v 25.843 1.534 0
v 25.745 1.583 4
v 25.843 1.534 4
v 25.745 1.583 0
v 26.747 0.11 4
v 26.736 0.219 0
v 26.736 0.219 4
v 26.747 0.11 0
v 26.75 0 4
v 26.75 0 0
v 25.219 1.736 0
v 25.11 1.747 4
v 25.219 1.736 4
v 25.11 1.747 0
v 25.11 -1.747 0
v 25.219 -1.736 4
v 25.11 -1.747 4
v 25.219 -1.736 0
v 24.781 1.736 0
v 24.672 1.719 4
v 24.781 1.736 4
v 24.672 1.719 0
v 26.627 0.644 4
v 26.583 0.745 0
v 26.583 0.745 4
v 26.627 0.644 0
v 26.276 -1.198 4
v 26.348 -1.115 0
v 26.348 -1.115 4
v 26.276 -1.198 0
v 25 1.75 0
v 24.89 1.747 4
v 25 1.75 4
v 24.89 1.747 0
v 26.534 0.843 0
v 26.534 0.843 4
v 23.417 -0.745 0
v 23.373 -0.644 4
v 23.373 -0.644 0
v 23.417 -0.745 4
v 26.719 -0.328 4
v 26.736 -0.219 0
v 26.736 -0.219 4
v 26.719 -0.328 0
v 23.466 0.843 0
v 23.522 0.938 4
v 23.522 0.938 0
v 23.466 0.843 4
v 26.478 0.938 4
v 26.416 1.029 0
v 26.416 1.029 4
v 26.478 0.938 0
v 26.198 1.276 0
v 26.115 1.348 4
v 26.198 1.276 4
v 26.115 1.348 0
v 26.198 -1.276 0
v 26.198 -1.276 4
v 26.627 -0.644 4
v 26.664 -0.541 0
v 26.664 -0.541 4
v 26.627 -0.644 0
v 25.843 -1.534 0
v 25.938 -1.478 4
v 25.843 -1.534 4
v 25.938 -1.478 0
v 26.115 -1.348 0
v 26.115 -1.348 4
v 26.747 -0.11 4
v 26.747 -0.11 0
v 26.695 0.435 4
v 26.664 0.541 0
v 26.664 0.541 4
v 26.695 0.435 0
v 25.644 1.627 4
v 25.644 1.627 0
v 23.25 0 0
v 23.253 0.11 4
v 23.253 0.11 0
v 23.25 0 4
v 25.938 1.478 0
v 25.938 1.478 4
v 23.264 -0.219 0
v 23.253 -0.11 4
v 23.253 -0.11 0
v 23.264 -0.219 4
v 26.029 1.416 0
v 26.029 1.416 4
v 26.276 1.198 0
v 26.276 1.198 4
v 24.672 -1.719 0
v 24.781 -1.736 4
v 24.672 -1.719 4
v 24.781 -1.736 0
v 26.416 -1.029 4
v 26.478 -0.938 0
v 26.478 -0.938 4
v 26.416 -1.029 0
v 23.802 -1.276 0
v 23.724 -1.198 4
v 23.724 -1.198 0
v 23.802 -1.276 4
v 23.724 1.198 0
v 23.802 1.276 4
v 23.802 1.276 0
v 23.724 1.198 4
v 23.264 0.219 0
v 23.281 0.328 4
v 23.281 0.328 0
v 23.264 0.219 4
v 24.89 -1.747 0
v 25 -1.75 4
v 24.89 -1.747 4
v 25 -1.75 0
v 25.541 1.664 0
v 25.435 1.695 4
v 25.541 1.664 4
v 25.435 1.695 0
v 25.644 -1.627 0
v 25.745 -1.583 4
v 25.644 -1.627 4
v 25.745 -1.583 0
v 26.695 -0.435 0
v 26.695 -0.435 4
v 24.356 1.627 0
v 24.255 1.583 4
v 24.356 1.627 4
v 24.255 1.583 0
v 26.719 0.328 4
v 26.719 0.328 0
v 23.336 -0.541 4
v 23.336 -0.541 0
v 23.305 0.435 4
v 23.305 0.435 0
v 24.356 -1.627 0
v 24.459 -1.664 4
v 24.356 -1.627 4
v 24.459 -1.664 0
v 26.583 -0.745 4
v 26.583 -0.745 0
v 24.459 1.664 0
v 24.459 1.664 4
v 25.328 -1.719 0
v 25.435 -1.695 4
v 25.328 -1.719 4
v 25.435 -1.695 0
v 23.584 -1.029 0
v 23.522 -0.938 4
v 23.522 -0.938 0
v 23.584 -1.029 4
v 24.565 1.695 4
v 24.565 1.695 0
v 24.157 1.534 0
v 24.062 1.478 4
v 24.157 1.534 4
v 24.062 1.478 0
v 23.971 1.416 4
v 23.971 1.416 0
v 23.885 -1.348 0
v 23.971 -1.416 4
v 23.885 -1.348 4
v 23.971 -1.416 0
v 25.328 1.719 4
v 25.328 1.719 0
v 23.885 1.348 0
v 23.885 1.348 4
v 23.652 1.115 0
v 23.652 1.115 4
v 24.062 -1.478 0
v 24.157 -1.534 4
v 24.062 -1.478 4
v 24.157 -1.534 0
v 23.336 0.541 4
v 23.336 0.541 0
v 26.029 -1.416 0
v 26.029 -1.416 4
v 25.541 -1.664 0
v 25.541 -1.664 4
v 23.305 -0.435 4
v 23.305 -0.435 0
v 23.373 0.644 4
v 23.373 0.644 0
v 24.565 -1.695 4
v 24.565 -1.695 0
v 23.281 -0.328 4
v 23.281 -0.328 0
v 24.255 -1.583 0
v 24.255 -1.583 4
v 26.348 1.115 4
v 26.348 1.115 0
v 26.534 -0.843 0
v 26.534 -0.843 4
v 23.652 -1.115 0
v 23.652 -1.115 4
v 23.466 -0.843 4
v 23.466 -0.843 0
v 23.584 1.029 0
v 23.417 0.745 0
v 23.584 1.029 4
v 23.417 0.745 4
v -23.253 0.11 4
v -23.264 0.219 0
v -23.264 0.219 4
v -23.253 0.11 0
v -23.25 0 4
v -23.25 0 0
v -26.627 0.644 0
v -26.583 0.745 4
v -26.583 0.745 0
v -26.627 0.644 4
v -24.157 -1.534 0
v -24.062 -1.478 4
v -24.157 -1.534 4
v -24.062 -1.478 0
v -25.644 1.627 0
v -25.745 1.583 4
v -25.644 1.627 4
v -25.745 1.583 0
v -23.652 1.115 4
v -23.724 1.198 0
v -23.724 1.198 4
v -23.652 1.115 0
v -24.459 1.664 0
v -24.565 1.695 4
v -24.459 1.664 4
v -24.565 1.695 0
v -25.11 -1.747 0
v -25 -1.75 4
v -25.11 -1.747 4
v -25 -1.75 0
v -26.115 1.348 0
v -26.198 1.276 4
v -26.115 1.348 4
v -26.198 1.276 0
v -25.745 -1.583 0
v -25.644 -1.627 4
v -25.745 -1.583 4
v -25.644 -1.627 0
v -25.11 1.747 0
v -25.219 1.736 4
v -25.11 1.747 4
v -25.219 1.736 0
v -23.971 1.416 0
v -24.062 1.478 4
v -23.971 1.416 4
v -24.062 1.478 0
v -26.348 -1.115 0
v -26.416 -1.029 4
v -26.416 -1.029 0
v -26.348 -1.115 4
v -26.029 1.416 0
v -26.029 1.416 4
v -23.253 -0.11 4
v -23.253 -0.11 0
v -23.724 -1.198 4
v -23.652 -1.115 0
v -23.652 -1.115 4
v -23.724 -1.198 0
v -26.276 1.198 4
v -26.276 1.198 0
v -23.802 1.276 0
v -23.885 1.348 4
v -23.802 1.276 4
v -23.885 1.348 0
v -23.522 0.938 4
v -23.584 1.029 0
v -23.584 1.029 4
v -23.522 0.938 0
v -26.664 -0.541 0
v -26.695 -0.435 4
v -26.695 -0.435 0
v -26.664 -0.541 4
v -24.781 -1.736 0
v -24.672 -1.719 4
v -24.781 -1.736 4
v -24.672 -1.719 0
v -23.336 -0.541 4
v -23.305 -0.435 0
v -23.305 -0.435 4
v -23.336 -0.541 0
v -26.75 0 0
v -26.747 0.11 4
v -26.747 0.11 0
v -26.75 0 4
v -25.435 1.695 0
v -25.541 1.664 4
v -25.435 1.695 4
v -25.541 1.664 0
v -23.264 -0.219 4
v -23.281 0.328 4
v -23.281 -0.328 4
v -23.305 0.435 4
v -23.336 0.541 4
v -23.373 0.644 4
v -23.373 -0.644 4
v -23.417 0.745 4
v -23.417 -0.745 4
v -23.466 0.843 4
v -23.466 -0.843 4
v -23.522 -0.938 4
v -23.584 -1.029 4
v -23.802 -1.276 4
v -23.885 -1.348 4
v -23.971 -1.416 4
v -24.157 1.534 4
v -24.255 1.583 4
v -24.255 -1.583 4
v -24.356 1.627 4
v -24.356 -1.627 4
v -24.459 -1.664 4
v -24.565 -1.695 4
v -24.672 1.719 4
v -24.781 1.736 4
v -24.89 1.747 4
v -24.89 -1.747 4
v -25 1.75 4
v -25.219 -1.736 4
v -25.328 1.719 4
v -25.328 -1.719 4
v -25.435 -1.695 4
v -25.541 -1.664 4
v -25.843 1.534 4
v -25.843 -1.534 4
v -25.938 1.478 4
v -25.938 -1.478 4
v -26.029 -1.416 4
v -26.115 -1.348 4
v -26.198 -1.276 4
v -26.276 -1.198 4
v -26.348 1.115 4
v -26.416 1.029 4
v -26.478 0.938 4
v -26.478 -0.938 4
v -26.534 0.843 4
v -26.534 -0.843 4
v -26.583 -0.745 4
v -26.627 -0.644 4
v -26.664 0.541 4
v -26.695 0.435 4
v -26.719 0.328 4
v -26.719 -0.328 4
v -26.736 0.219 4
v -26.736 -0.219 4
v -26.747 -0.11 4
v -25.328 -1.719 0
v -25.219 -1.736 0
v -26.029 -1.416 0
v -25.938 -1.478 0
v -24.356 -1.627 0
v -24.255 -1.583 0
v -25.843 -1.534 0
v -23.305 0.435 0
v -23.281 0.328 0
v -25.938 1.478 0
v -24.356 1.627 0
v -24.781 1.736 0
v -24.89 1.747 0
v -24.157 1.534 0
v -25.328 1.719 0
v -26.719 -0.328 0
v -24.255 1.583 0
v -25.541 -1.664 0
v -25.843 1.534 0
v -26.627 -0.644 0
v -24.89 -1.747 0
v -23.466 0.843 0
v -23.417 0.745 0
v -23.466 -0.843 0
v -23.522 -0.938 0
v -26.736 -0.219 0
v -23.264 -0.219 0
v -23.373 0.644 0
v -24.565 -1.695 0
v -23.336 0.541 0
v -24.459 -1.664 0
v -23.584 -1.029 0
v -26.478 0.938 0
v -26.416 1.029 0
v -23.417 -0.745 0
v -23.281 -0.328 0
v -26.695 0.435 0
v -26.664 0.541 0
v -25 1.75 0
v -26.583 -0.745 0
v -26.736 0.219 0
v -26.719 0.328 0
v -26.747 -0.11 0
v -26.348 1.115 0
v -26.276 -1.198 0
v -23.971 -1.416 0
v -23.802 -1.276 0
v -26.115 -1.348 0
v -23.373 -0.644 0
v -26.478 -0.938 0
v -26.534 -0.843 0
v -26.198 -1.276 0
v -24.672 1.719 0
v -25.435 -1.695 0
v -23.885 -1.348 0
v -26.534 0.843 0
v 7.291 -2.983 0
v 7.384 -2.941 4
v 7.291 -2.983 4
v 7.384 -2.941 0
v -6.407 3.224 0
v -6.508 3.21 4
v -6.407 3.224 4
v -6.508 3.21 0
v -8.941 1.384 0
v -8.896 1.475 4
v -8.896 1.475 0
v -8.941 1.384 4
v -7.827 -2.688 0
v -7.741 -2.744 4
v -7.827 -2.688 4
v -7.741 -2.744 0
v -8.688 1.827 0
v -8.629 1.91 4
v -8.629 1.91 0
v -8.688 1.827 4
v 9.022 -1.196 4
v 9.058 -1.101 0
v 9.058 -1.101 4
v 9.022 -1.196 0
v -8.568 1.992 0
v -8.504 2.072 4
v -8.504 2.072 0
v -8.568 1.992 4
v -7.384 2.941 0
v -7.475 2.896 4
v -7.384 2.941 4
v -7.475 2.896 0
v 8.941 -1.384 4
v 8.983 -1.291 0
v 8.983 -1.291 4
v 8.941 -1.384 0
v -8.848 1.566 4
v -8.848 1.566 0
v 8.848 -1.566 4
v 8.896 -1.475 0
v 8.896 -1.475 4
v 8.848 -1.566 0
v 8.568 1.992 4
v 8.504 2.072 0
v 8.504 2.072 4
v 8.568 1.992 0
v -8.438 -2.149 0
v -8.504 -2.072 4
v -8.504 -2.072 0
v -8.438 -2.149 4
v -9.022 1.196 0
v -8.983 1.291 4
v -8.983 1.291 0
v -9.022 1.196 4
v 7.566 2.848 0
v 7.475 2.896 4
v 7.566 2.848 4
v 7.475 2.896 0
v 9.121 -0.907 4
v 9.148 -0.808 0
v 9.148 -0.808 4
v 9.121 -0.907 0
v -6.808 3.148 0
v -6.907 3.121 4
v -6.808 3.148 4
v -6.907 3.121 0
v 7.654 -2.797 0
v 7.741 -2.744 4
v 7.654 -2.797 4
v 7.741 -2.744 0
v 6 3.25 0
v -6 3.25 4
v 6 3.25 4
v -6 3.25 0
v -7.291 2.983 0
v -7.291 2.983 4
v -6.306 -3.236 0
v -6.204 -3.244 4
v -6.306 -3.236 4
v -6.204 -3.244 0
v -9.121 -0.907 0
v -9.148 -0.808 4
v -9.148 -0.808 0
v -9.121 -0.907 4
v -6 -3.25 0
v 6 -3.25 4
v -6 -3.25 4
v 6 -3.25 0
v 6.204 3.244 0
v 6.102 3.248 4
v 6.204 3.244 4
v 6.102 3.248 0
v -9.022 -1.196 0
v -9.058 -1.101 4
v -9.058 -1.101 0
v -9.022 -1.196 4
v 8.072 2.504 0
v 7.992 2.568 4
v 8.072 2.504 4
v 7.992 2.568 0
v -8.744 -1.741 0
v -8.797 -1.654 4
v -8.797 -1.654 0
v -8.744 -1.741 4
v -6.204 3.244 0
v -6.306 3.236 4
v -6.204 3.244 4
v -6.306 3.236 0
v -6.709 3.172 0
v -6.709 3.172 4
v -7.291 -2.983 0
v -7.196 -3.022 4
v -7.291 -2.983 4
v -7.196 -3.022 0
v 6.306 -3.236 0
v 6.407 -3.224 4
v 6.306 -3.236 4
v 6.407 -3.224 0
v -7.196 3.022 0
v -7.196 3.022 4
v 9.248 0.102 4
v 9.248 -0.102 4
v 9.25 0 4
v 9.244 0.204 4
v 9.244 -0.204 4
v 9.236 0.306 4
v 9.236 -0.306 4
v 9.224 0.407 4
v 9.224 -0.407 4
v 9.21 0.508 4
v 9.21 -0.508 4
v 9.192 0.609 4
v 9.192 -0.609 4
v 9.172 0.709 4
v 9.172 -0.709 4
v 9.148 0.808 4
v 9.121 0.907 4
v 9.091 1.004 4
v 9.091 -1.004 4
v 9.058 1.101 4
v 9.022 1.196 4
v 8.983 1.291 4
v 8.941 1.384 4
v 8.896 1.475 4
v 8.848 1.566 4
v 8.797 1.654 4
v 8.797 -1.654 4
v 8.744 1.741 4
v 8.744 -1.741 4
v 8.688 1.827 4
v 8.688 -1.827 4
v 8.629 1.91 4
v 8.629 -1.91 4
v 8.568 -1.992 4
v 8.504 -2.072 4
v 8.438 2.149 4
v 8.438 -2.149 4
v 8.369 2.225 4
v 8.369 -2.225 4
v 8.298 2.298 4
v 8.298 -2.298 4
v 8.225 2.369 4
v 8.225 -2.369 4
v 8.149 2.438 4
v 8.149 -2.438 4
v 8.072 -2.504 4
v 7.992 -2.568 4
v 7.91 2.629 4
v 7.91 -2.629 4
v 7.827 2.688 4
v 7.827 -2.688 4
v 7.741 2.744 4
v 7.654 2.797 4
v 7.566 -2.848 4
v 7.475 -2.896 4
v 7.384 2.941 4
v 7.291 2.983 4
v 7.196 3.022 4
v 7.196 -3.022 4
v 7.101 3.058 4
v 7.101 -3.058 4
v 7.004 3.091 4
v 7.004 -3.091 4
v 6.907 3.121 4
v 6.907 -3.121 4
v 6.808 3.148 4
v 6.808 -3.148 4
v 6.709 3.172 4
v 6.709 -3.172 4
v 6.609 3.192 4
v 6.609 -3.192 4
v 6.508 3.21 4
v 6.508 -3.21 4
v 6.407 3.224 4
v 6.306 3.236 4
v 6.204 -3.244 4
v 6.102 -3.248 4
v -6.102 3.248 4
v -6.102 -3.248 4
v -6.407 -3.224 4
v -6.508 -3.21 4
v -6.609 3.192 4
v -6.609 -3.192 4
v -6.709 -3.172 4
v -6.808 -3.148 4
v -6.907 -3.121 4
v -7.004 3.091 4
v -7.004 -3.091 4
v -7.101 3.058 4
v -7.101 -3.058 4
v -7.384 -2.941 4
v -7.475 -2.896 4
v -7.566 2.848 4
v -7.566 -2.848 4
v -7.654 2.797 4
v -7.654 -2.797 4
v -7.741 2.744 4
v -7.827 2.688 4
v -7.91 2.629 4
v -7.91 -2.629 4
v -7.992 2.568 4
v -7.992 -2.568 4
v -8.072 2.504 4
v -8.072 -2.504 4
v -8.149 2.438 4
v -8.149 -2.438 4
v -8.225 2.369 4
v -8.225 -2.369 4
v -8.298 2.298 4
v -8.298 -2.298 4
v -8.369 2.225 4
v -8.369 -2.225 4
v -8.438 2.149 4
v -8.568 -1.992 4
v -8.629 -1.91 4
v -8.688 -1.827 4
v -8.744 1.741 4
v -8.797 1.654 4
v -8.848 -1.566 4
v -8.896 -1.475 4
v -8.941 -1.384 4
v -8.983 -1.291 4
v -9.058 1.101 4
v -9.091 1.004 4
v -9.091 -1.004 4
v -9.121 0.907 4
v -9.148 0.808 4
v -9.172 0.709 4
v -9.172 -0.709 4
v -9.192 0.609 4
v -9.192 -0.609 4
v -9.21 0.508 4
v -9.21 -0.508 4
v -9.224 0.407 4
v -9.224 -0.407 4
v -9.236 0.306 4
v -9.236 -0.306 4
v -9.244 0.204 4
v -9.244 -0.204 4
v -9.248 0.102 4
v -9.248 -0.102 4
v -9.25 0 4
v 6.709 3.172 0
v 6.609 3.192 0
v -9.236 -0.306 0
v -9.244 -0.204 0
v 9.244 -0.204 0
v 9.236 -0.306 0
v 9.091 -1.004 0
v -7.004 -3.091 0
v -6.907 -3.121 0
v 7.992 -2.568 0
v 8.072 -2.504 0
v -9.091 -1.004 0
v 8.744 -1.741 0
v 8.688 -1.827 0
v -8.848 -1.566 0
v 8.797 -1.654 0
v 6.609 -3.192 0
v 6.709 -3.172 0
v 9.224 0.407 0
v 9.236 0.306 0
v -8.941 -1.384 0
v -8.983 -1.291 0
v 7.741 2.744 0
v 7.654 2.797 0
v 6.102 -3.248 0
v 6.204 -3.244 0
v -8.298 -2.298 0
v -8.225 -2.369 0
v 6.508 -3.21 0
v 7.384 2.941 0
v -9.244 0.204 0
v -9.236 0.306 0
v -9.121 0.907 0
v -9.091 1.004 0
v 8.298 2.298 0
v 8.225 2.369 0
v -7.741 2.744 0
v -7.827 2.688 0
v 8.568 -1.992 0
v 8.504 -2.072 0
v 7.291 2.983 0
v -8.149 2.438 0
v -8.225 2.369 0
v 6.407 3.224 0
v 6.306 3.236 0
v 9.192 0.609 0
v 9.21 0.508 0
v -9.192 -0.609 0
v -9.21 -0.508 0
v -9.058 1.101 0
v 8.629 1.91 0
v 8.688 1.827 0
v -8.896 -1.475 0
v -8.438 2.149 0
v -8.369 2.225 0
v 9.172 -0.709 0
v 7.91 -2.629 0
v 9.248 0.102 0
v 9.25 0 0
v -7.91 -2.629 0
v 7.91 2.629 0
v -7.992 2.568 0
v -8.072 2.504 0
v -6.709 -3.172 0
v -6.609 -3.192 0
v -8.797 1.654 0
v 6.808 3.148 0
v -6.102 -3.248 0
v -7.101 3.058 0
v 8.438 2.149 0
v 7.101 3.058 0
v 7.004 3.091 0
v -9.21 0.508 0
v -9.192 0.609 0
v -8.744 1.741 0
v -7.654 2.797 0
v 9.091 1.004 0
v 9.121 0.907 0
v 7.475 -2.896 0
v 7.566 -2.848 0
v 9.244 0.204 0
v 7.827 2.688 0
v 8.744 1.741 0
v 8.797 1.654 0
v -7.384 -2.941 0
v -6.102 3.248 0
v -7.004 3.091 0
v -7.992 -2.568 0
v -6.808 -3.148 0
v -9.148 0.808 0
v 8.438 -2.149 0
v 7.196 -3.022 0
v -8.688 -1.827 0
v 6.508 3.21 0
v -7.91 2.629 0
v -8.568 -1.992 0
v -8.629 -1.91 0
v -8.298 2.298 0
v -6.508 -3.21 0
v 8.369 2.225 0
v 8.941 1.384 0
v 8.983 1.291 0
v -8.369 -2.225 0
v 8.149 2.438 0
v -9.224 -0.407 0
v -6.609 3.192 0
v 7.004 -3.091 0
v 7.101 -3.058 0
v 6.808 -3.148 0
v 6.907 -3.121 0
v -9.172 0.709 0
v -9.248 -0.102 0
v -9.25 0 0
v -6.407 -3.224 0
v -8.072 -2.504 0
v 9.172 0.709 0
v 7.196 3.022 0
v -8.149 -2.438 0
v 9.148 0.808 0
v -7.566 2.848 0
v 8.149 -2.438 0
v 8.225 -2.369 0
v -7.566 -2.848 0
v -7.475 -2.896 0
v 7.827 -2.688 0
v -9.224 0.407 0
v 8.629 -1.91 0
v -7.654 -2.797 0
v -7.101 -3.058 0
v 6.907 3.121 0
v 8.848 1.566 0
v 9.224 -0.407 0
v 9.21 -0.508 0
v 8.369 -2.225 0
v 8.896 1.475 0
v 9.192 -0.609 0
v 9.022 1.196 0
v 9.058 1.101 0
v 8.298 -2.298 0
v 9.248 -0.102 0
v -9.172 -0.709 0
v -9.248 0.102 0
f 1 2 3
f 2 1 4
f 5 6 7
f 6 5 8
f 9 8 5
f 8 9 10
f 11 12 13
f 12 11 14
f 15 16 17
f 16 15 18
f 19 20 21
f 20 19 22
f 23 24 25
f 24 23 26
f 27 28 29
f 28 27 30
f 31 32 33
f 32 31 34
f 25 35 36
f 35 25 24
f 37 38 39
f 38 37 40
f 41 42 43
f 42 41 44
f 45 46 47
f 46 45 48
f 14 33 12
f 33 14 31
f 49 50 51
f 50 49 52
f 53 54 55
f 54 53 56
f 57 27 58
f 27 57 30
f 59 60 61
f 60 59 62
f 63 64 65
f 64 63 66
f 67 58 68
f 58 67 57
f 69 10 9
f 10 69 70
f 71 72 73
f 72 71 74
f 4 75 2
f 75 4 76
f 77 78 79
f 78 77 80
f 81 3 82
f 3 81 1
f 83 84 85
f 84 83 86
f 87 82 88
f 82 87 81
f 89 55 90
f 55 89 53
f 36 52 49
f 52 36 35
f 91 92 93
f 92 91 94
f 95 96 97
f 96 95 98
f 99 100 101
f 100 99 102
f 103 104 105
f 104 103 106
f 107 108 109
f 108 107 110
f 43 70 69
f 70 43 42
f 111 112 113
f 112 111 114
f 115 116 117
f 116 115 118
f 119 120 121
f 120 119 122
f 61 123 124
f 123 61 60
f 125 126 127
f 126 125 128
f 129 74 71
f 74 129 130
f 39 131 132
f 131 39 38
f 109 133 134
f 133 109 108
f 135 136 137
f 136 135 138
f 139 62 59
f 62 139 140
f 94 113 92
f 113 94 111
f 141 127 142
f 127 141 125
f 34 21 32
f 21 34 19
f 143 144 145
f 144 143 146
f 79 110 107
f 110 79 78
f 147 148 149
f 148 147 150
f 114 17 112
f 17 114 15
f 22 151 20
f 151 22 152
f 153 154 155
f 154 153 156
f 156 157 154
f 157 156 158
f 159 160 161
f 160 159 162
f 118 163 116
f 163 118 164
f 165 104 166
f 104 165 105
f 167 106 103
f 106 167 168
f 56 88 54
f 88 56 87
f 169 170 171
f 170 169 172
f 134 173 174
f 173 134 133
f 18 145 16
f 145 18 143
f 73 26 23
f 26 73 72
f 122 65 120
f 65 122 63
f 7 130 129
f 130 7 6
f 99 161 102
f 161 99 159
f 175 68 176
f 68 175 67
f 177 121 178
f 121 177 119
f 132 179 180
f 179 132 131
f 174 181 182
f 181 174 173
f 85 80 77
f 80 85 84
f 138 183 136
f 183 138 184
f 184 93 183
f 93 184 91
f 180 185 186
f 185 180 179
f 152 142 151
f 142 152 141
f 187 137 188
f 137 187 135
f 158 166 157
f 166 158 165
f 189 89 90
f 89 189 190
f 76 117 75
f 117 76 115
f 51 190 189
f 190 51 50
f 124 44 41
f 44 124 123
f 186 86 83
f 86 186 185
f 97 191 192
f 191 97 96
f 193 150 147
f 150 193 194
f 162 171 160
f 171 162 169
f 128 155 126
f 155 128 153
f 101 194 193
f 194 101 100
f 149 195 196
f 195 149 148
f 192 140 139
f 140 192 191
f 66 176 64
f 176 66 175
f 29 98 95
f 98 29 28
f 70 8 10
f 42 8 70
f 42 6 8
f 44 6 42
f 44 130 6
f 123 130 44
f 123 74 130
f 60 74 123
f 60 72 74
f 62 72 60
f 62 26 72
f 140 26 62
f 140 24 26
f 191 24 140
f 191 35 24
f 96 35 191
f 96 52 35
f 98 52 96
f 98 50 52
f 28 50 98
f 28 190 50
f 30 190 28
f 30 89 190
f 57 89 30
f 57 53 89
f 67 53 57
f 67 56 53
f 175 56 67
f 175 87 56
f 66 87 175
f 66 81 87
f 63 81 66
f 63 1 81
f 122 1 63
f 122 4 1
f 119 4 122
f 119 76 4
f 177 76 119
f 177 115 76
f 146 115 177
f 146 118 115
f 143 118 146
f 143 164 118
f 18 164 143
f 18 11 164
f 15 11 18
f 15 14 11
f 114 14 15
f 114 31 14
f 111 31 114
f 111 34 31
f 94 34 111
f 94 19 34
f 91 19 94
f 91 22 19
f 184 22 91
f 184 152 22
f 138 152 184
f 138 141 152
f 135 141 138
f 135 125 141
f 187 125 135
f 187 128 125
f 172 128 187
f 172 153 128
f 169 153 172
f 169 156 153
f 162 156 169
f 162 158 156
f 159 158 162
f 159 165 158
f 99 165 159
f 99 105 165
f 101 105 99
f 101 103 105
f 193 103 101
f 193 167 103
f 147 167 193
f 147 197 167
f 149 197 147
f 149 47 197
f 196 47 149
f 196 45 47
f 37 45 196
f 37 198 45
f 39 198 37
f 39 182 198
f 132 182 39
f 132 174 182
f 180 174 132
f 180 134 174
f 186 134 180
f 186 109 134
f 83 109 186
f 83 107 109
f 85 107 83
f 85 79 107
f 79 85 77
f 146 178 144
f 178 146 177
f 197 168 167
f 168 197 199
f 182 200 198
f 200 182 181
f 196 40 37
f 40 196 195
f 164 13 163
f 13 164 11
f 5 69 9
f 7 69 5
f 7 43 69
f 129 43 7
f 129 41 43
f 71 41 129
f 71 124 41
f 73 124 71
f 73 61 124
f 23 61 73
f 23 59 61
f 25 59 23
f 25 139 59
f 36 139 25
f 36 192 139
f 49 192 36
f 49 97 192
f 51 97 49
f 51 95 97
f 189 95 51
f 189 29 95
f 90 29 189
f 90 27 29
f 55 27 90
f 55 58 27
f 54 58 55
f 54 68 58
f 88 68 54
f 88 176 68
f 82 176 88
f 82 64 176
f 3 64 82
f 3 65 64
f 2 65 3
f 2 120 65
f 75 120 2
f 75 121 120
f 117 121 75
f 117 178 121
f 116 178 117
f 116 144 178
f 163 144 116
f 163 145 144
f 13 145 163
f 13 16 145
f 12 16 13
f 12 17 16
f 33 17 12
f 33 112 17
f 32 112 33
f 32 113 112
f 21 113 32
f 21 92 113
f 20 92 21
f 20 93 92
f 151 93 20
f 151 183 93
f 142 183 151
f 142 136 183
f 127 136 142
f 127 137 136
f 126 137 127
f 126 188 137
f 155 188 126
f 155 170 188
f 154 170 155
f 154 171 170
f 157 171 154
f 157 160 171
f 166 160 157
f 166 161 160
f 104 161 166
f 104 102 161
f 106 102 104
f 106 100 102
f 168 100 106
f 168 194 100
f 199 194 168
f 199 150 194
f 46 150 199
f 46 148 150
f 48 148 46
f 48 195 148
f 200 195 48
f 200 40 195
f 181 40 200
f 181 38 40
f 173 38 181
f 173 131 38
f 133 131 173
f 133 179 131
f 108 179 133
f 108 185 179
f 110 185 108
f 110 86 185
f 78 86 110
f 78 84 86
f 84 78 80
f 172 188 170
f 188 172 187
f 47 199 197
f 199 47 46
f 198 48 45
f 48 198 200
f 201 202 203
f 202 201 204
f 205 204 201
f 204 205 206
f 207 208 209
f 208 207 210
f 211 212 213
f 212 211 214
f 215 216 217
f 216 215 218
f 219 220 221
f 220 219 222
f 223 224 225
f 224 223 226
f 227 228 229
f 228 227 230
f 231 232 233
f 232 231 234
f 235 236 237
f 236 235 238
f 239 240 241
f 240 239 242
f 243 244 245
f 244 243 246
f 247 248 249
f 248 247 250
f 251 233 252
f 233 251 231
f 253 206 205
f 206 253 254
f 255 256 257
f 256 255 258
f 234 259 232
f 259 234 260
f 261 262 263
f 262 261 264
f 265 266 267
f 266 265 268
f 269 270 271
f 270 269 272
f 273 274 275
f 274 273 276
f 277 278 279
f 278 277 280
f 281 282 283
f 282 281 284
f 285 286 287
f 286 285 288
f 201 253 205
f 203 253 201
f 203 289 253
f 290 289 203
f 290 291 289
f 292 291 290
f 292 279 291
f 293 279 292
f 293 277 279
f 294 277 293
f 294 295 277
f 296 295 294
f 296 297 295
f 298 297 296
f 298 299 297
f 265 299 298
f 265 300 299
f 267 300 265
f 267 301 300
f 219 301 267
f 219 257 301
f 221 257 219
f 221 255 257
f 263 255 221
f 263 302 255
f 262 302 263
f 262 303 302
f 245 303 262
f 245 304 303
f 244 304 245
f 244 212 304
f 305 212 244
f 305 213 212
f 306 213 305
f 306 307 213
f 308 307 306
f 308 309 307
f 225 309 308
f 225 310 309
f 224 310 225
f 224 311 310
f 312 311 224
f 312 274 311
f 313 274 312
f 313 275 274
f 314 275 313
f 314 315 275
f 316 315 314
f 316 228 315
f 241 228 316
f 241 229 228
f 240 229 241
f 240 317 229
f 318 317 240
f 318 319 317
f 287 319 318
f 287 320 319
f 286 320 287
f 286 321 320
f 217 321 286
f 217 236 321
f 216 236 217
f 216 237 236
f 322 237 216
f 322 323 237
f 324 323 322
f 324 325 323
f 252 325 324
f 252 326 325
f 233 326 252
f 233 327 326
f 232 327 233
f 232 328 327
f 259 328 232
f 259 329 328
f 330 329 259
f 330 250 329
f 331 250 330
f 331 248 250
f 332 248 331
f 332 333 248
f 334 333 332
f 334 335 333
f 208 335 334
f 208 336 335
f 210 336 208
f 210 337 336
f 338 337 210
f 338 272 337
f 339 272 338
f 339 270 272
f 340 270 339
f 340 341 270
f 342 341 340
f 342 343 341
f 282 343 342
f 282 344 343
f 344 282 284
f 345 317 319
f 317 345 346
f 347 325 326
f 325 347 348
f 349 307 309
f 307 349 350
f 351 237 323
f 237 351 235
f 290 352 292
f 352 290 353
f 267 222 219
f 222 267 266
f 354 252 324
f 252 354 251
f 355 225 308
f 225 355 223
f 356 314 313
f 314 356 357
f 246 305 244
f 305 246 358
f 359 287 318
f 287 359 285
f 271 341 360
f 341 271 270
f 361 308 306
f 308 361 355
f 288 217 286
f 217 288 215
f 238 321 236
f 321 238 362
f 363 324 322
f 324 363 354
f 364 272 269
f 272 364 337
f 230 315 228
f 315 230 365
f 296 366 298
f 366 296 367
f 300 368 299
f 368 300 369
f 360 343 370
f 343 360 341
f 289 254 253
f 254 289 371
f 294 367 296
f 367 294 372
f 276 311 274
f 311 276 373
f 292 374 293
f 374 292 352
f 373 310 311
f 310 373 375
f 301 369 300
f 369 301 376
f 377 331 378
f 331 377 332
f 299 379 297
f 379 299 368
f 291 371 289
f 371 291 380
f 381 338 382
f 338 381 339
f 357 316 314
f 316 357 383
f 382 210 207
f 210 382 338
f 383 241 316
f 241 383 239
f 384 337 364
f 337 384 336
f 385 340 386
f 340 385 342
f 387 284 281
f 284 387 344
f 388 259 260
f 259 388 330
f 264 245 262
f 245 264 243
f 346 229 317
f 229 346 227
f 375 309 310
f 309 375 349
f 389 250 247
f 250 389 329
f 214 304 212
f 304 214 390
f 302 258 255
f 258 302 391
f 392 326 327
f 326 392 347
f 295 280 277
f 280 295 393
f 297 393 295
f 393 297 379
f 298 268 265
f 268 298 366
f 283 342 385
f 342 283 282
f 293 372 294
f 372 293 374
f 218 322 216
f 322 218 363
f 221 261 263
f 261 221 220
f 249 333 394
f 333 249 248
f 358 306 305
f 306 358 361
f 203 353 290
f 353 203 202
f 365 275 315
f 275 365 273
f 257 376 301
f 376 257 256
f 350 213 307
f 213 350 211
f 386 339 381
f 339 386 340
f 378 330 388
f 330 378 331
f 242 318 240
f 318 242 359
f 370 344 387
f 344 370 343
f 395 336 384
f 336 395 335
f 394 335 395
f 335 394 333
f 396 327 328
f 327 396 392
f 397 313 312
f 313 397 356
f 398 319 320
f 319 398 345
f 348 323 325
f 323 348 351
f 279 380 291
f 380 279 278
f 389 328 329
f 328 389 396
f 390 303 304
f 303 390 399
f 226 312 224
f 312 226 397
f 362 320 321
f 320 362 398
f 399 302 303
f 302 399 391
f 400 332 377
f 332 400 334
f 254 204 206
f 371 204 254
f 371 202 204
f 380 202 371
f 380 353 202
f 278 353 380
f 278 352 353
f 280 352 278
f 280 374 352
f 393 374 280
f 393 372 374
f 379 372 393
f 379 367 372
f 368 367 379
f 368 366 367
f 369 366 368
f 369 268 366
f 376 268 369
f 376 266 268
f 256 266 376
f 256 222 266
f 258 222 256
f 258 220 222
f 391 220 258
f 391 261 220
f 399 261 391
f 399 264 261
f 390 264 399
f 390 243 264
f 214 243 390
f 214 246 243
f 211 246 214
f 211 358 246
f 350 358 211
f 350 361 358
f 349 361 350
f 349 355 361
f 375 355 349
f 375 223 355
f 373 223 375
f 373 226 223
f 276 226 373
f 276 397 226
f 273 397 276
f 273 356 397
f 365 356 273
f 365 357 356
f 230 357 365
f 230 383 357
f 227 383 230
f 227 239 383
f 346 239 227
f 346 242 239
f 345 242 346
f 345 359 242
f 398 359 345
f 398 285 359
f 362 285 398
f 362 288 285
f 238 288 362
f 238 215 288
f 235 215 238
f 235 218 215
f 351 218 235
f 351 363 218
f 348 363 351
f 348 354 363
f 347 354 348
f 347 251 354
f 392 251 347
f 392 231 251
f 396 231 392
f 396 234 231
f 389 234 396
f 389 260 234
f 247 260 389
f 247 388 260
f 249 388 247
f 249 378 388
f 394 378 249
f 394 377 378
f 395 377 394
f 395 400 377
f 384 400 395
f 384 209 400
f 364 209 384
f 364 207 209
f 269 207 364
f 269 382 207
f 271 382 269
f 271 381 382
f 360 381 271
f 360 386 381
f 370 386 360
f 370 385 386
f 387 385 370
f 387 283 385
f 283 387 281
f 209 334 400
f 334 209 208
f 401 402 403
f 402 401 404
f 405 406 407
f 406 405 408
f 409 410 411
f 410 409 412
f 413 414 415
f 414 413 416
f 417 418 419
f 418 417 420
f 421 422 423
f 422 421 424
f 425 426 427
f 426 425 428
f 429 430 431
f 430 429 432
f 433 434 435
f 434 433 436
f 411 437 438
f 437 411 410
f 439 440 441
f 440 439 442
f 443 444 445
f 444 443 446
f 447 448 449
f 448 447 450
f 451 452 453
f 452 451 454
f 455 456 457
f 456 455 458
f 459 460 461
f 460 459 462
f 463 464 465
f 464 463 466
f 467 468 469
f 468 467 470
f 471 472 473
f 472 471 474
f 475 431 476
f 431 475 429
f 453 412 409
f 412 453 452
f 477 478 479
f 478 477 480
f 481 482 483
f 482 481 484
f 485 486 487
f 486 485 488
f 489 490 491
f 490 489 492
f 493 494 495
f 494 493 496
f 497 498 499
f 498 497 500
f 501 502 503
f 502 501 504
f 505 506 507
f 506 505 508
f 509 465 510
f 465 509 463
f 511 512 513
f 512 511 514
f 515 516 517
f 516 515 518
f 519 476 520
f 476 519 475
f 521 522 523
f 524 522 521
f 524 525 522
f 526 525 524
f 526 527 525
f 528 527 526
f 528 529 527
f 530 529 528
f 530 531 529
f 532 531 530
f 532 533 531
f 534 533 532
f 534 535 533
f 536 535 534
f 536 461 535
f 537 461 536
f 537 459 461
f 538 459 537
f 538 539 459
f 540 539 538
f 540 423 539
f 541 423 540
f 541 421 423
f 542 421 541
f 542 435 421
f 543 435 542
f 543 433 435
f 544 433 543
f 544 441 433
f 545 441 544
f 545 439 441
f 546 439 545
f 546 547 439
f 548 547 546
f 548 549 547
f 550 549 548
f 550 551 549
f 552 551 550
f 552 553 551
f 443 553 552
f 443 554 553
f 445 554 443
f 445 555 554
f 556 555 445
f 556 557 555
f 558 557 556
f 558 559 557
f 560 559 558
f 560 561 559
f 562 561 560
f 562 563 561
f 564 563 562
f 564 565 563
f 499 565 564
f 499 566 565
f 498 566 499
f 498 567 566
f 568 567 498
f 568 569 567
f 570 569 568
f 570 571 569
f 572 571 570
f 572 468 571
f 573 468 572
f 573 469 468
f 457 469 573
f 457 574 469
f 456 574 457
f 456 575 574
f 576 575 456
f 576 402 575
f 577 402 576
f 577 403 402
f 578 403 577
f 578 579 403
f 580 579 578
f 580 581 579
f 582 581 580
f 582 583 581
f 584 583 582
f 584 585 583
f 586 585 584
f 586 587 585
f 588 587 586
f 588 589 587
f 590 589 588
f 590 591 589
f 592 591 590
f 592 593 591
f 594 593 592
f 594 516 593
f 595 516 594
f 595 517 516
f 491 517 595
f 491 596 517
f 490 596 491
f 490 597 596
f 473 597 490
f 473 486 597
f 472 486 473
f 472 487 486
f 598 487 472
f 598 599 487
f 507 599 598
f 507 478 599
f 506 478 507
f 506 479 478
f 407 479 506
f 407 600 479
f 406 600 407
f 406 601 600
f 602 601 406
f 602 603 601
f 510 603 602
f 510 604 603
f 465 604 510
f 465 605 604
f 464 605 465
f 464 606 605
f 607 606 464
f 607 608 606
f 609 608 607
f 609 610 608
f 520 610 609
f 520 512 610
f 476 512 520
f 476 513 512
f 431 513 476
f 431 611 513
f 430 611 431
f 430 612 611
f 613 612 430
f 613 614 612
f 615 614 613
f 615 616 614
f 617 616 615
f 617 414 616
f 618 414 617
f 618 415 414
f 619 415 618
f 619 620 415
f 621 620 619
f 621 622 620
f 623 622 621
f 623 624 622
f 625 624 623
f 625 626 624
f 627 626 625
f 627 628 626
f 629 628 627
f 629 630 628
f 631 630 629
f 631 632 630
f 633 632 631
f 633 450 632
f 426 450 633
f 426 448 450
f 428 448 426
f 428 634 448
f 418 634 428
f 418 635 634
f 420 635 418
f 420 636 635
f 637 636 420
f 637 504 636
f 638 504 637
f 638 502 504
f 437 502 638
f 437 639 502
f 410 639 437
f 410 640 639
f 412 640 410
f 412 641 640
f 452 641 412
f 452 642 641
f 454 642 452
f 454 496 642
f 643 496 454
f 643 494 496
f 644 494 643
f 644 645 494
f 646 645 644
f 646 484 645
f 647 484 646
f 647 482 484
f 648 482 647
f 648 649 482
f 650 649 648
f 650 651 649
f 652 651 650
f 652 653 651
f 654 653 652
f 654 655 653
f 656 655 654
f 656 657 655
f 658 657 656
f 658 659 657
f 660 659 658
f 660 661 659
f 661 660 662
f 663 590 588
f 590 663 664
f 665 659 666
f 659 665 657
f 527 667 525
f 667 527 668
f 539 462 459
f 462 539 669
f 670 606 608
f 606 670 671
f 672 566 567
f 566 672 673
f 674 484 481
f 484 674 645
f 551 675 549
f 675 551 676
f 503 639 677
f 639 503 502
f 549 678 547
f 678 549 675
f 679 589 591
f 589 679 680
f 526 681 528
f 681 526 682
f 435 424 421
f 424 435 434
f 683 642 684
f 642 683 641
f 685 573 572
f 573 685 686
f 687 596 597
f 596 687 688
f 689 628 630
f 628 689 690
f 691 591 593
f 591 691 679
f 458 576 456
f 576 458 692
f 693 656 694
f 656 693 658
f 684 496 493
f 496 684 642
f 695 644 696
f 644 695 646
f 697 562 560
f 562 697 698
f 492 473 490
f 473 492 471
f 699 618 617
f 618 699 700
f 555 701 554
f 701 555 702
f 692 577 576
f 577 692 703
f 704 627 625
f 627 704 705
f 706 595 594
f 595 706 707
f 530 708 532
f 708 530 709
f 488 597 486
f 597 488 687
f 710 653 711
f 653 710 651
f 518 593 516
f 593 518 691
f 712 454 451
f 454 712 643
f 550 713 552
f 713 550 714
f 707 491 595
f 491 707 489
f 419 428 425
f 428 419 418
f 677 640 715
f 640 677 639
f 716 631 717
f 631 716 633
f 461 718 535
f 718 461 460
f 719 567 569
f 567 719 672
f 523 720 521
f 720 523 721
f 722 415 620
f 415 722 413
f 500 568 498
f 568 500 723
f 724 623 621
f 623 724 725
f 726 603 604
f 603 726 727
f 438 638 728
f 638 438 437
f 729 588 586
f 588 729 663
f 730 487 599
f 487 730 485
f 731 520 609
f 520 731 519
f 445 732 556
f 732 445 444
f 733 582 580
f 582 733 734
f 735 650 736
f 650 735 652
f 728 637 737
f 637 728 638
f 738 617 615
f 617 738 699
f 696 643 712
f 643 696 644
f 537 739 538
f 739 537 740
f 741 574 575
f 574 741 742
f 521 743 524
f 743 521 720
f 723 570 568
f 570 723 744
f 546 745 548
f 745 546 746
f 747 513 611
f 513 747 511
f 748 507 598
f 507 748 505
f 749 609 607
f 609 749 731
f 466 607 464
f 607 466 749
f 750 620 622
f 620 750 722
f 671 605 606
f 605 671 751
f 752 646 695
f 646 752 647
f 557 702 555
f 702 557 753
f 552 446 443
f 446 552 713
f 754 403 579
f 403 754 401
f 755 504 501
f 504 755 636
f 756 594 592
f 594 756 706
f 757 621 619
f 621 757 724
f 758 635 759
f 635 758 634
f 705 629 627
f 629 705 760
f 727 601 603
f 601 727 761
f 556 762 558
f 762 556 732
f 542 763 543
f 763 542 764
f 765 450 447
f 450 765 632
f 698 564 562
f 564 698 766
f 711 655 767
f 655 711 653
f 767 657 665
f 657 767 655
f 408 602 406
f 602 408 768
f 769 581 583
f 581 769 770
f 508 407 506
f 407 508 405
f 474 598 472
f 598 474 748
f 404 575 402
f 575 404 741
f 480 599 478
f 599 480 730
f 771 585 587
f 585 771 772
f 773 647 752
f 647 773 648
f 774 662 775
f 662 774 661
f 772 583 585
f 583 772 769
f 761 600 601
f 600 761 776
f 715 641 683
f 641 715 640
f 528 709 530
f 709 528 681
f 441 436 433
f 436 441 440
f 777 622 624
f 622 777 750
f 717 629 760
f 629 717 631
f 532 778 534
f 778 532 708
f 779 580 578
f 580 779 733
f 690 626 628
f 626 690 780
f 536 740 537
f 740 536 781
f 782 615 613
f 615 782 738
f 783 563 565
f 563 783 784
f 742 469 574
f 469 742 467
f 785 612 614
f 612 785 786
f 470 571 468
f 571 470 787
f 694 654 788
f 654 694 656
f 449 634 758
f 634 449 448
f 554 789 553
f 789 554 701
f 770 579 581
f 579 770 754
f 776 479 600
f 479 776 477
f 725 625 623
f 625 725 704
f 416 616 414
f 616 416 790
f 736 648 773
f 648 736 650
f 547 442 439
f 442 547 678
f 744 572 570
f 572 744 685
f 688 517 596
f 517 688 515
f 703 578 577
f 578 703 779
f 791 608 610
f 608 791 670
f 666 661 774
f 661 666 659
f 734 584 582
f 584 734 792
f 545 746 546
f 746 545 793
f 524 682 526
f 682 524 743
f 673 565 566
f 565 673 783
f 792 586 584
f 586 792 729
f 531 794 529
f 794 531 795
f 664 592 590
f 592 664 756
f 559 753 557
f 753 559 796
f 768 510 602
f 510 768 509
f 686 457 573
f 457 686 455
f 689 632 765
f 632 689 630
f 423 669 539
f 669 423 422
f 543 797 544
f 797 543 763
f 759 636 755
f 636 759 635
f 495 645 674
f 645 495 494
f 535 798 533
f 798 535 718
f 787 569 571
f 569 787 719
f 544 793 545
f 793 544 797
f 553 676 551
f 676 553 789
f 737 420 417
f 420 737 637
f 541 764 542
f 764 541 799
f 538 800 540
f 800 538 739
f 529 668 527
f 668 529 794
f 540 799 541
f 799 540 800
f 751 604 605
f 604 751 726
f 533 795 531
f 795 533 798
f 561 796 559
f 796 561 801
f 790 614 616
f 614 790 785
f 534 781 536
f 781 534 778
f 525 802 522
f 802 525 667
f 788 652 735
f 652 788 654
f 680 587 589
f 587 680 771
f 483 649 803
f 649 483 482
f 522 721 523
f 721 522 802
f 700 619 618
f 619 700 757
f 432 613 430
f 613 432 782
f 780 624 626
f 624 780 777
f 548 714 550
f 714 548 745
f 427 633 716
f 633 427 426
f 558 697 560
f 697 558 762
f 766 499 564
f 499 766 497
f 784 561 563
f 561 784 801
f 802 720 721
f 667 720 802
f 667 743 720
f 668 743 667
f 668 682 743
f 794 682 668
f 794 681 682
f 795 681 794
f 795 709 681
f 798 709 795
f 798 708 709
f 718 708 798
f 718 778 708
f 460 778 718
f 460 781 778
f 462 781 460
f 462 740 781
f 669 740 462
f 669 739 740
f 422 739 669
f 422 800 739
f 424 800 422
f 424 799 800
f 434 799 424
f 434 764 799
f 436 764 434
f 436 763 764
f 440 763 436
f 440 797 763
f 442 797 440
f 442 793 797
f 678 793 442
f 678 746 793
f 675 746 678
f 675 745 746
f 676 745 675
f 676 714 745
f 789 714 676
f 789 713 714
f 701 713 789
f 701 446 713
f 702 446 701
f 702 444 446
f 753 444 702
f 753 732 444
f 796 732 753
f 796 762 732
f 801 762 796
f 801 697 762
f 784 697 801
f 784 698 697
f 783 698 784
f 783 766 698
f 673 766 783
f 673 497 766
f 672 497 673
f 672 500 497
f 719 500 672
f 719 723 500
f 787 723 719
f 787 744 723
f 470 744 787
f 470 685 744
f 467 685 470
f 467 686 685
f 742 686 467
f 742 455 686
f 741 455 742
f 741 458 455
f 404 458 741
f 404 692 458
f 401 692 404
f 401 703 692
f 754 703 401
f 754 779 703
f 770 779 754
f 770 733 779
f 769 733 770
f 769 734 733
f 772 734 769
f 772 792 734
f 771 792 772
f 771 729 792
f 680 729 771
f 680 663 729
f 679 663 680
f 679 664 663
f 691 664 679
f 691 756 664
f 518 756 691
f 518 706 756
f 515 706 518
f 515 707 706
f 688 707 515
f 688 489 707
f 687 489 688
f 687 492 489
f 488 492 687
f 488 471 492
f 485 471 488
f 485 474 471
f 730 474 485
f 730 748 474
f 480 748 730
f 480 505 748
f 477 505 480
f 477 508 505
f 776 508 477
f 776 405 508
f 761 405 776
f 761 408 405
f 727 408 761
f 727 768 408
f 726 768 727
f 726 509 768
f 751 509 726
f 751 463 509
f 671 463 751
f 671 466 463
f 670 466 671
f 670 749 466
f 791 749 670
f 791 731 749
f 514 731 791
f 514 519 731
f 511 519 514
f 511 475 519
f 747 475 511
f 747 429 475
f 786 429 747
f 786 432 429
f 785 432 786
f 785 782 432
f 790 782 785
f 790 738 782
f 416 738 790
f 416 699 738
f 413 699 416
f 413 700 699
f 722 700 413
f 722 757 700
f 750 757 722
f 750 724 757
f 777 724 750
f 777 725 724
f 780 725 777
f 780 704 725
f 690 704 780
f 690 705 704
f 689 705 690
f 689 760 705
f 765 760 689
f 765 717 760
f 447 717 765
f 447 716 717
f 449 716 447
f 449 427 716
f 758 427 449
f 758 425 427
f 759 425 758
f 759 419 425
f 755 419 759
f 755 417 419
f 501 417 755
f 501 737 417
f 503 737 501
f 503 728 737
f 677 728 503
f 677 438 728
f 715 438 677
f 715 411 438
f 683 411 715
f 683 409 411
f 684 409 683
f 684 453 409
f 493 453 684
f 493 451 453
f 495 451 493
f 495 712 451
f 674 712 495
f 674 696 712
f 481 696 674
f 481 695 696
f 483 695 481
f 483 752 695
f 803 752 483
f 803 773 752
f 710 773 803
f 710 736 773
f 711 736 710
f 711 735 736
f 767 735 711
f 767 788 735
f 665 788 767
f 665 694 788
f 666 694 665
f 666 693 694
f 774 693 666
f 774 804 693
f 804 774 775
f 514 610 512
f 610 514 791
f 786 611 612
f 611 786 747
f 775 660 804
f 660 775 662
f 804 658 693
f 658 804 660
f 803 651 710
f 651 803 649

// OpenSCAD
// file: ../envelopes/usb-hole-envelope.scad
usbHoleEnvelope();

module usbHoleEnvelope(
    height = 6.5,
    width = 12,
    thickness = 10,
    center = true,
    $fn = 200
) {
    hull() {
        translate([- width / 2, 0, 0])
            cylinder(h = thickness, d = height, center = center, $fn = $fn);

        translate([width / 2, 0, 0])
            cylinder(h = thickness, d = height, center = center, $fn = $fn);
    }
}
// main file
use <../envelopes/usb-hole-envelope.scad>

throwsHolderInternalFix();


/**
 * throwsHolderInternalFix
 * @name throwsHolderInternalFix
 * @description Throws for internal holder fix
 * @type throws
 * @parent
 * @stl
 */
module throwsHolderInternalFix(
    throws_dephs = 4,
    facade_width = 50,
    facade_throws_diameter = 3,
    facade_hole_3mm_correction = 0.5,

    _fn = 100
) {

    throws_diameter_with_correction = facade_throws_diameter + facade_hole_3mm_correction;

    translate([facade_width / 2, 0, 0])
        cylinder(h = throws_dephs, d = throws_diameter_with_correction, center = false, $fn = _fn);

    translate([-facade_width / 2, 0, 0])
        cylinder(h = throws_dephs, d = throws_diameter_with_correction, center = false, $fn = _fn);


    usbHoleEnvelope(
        thickness = throws_dephs,
        center = false
    );

}
